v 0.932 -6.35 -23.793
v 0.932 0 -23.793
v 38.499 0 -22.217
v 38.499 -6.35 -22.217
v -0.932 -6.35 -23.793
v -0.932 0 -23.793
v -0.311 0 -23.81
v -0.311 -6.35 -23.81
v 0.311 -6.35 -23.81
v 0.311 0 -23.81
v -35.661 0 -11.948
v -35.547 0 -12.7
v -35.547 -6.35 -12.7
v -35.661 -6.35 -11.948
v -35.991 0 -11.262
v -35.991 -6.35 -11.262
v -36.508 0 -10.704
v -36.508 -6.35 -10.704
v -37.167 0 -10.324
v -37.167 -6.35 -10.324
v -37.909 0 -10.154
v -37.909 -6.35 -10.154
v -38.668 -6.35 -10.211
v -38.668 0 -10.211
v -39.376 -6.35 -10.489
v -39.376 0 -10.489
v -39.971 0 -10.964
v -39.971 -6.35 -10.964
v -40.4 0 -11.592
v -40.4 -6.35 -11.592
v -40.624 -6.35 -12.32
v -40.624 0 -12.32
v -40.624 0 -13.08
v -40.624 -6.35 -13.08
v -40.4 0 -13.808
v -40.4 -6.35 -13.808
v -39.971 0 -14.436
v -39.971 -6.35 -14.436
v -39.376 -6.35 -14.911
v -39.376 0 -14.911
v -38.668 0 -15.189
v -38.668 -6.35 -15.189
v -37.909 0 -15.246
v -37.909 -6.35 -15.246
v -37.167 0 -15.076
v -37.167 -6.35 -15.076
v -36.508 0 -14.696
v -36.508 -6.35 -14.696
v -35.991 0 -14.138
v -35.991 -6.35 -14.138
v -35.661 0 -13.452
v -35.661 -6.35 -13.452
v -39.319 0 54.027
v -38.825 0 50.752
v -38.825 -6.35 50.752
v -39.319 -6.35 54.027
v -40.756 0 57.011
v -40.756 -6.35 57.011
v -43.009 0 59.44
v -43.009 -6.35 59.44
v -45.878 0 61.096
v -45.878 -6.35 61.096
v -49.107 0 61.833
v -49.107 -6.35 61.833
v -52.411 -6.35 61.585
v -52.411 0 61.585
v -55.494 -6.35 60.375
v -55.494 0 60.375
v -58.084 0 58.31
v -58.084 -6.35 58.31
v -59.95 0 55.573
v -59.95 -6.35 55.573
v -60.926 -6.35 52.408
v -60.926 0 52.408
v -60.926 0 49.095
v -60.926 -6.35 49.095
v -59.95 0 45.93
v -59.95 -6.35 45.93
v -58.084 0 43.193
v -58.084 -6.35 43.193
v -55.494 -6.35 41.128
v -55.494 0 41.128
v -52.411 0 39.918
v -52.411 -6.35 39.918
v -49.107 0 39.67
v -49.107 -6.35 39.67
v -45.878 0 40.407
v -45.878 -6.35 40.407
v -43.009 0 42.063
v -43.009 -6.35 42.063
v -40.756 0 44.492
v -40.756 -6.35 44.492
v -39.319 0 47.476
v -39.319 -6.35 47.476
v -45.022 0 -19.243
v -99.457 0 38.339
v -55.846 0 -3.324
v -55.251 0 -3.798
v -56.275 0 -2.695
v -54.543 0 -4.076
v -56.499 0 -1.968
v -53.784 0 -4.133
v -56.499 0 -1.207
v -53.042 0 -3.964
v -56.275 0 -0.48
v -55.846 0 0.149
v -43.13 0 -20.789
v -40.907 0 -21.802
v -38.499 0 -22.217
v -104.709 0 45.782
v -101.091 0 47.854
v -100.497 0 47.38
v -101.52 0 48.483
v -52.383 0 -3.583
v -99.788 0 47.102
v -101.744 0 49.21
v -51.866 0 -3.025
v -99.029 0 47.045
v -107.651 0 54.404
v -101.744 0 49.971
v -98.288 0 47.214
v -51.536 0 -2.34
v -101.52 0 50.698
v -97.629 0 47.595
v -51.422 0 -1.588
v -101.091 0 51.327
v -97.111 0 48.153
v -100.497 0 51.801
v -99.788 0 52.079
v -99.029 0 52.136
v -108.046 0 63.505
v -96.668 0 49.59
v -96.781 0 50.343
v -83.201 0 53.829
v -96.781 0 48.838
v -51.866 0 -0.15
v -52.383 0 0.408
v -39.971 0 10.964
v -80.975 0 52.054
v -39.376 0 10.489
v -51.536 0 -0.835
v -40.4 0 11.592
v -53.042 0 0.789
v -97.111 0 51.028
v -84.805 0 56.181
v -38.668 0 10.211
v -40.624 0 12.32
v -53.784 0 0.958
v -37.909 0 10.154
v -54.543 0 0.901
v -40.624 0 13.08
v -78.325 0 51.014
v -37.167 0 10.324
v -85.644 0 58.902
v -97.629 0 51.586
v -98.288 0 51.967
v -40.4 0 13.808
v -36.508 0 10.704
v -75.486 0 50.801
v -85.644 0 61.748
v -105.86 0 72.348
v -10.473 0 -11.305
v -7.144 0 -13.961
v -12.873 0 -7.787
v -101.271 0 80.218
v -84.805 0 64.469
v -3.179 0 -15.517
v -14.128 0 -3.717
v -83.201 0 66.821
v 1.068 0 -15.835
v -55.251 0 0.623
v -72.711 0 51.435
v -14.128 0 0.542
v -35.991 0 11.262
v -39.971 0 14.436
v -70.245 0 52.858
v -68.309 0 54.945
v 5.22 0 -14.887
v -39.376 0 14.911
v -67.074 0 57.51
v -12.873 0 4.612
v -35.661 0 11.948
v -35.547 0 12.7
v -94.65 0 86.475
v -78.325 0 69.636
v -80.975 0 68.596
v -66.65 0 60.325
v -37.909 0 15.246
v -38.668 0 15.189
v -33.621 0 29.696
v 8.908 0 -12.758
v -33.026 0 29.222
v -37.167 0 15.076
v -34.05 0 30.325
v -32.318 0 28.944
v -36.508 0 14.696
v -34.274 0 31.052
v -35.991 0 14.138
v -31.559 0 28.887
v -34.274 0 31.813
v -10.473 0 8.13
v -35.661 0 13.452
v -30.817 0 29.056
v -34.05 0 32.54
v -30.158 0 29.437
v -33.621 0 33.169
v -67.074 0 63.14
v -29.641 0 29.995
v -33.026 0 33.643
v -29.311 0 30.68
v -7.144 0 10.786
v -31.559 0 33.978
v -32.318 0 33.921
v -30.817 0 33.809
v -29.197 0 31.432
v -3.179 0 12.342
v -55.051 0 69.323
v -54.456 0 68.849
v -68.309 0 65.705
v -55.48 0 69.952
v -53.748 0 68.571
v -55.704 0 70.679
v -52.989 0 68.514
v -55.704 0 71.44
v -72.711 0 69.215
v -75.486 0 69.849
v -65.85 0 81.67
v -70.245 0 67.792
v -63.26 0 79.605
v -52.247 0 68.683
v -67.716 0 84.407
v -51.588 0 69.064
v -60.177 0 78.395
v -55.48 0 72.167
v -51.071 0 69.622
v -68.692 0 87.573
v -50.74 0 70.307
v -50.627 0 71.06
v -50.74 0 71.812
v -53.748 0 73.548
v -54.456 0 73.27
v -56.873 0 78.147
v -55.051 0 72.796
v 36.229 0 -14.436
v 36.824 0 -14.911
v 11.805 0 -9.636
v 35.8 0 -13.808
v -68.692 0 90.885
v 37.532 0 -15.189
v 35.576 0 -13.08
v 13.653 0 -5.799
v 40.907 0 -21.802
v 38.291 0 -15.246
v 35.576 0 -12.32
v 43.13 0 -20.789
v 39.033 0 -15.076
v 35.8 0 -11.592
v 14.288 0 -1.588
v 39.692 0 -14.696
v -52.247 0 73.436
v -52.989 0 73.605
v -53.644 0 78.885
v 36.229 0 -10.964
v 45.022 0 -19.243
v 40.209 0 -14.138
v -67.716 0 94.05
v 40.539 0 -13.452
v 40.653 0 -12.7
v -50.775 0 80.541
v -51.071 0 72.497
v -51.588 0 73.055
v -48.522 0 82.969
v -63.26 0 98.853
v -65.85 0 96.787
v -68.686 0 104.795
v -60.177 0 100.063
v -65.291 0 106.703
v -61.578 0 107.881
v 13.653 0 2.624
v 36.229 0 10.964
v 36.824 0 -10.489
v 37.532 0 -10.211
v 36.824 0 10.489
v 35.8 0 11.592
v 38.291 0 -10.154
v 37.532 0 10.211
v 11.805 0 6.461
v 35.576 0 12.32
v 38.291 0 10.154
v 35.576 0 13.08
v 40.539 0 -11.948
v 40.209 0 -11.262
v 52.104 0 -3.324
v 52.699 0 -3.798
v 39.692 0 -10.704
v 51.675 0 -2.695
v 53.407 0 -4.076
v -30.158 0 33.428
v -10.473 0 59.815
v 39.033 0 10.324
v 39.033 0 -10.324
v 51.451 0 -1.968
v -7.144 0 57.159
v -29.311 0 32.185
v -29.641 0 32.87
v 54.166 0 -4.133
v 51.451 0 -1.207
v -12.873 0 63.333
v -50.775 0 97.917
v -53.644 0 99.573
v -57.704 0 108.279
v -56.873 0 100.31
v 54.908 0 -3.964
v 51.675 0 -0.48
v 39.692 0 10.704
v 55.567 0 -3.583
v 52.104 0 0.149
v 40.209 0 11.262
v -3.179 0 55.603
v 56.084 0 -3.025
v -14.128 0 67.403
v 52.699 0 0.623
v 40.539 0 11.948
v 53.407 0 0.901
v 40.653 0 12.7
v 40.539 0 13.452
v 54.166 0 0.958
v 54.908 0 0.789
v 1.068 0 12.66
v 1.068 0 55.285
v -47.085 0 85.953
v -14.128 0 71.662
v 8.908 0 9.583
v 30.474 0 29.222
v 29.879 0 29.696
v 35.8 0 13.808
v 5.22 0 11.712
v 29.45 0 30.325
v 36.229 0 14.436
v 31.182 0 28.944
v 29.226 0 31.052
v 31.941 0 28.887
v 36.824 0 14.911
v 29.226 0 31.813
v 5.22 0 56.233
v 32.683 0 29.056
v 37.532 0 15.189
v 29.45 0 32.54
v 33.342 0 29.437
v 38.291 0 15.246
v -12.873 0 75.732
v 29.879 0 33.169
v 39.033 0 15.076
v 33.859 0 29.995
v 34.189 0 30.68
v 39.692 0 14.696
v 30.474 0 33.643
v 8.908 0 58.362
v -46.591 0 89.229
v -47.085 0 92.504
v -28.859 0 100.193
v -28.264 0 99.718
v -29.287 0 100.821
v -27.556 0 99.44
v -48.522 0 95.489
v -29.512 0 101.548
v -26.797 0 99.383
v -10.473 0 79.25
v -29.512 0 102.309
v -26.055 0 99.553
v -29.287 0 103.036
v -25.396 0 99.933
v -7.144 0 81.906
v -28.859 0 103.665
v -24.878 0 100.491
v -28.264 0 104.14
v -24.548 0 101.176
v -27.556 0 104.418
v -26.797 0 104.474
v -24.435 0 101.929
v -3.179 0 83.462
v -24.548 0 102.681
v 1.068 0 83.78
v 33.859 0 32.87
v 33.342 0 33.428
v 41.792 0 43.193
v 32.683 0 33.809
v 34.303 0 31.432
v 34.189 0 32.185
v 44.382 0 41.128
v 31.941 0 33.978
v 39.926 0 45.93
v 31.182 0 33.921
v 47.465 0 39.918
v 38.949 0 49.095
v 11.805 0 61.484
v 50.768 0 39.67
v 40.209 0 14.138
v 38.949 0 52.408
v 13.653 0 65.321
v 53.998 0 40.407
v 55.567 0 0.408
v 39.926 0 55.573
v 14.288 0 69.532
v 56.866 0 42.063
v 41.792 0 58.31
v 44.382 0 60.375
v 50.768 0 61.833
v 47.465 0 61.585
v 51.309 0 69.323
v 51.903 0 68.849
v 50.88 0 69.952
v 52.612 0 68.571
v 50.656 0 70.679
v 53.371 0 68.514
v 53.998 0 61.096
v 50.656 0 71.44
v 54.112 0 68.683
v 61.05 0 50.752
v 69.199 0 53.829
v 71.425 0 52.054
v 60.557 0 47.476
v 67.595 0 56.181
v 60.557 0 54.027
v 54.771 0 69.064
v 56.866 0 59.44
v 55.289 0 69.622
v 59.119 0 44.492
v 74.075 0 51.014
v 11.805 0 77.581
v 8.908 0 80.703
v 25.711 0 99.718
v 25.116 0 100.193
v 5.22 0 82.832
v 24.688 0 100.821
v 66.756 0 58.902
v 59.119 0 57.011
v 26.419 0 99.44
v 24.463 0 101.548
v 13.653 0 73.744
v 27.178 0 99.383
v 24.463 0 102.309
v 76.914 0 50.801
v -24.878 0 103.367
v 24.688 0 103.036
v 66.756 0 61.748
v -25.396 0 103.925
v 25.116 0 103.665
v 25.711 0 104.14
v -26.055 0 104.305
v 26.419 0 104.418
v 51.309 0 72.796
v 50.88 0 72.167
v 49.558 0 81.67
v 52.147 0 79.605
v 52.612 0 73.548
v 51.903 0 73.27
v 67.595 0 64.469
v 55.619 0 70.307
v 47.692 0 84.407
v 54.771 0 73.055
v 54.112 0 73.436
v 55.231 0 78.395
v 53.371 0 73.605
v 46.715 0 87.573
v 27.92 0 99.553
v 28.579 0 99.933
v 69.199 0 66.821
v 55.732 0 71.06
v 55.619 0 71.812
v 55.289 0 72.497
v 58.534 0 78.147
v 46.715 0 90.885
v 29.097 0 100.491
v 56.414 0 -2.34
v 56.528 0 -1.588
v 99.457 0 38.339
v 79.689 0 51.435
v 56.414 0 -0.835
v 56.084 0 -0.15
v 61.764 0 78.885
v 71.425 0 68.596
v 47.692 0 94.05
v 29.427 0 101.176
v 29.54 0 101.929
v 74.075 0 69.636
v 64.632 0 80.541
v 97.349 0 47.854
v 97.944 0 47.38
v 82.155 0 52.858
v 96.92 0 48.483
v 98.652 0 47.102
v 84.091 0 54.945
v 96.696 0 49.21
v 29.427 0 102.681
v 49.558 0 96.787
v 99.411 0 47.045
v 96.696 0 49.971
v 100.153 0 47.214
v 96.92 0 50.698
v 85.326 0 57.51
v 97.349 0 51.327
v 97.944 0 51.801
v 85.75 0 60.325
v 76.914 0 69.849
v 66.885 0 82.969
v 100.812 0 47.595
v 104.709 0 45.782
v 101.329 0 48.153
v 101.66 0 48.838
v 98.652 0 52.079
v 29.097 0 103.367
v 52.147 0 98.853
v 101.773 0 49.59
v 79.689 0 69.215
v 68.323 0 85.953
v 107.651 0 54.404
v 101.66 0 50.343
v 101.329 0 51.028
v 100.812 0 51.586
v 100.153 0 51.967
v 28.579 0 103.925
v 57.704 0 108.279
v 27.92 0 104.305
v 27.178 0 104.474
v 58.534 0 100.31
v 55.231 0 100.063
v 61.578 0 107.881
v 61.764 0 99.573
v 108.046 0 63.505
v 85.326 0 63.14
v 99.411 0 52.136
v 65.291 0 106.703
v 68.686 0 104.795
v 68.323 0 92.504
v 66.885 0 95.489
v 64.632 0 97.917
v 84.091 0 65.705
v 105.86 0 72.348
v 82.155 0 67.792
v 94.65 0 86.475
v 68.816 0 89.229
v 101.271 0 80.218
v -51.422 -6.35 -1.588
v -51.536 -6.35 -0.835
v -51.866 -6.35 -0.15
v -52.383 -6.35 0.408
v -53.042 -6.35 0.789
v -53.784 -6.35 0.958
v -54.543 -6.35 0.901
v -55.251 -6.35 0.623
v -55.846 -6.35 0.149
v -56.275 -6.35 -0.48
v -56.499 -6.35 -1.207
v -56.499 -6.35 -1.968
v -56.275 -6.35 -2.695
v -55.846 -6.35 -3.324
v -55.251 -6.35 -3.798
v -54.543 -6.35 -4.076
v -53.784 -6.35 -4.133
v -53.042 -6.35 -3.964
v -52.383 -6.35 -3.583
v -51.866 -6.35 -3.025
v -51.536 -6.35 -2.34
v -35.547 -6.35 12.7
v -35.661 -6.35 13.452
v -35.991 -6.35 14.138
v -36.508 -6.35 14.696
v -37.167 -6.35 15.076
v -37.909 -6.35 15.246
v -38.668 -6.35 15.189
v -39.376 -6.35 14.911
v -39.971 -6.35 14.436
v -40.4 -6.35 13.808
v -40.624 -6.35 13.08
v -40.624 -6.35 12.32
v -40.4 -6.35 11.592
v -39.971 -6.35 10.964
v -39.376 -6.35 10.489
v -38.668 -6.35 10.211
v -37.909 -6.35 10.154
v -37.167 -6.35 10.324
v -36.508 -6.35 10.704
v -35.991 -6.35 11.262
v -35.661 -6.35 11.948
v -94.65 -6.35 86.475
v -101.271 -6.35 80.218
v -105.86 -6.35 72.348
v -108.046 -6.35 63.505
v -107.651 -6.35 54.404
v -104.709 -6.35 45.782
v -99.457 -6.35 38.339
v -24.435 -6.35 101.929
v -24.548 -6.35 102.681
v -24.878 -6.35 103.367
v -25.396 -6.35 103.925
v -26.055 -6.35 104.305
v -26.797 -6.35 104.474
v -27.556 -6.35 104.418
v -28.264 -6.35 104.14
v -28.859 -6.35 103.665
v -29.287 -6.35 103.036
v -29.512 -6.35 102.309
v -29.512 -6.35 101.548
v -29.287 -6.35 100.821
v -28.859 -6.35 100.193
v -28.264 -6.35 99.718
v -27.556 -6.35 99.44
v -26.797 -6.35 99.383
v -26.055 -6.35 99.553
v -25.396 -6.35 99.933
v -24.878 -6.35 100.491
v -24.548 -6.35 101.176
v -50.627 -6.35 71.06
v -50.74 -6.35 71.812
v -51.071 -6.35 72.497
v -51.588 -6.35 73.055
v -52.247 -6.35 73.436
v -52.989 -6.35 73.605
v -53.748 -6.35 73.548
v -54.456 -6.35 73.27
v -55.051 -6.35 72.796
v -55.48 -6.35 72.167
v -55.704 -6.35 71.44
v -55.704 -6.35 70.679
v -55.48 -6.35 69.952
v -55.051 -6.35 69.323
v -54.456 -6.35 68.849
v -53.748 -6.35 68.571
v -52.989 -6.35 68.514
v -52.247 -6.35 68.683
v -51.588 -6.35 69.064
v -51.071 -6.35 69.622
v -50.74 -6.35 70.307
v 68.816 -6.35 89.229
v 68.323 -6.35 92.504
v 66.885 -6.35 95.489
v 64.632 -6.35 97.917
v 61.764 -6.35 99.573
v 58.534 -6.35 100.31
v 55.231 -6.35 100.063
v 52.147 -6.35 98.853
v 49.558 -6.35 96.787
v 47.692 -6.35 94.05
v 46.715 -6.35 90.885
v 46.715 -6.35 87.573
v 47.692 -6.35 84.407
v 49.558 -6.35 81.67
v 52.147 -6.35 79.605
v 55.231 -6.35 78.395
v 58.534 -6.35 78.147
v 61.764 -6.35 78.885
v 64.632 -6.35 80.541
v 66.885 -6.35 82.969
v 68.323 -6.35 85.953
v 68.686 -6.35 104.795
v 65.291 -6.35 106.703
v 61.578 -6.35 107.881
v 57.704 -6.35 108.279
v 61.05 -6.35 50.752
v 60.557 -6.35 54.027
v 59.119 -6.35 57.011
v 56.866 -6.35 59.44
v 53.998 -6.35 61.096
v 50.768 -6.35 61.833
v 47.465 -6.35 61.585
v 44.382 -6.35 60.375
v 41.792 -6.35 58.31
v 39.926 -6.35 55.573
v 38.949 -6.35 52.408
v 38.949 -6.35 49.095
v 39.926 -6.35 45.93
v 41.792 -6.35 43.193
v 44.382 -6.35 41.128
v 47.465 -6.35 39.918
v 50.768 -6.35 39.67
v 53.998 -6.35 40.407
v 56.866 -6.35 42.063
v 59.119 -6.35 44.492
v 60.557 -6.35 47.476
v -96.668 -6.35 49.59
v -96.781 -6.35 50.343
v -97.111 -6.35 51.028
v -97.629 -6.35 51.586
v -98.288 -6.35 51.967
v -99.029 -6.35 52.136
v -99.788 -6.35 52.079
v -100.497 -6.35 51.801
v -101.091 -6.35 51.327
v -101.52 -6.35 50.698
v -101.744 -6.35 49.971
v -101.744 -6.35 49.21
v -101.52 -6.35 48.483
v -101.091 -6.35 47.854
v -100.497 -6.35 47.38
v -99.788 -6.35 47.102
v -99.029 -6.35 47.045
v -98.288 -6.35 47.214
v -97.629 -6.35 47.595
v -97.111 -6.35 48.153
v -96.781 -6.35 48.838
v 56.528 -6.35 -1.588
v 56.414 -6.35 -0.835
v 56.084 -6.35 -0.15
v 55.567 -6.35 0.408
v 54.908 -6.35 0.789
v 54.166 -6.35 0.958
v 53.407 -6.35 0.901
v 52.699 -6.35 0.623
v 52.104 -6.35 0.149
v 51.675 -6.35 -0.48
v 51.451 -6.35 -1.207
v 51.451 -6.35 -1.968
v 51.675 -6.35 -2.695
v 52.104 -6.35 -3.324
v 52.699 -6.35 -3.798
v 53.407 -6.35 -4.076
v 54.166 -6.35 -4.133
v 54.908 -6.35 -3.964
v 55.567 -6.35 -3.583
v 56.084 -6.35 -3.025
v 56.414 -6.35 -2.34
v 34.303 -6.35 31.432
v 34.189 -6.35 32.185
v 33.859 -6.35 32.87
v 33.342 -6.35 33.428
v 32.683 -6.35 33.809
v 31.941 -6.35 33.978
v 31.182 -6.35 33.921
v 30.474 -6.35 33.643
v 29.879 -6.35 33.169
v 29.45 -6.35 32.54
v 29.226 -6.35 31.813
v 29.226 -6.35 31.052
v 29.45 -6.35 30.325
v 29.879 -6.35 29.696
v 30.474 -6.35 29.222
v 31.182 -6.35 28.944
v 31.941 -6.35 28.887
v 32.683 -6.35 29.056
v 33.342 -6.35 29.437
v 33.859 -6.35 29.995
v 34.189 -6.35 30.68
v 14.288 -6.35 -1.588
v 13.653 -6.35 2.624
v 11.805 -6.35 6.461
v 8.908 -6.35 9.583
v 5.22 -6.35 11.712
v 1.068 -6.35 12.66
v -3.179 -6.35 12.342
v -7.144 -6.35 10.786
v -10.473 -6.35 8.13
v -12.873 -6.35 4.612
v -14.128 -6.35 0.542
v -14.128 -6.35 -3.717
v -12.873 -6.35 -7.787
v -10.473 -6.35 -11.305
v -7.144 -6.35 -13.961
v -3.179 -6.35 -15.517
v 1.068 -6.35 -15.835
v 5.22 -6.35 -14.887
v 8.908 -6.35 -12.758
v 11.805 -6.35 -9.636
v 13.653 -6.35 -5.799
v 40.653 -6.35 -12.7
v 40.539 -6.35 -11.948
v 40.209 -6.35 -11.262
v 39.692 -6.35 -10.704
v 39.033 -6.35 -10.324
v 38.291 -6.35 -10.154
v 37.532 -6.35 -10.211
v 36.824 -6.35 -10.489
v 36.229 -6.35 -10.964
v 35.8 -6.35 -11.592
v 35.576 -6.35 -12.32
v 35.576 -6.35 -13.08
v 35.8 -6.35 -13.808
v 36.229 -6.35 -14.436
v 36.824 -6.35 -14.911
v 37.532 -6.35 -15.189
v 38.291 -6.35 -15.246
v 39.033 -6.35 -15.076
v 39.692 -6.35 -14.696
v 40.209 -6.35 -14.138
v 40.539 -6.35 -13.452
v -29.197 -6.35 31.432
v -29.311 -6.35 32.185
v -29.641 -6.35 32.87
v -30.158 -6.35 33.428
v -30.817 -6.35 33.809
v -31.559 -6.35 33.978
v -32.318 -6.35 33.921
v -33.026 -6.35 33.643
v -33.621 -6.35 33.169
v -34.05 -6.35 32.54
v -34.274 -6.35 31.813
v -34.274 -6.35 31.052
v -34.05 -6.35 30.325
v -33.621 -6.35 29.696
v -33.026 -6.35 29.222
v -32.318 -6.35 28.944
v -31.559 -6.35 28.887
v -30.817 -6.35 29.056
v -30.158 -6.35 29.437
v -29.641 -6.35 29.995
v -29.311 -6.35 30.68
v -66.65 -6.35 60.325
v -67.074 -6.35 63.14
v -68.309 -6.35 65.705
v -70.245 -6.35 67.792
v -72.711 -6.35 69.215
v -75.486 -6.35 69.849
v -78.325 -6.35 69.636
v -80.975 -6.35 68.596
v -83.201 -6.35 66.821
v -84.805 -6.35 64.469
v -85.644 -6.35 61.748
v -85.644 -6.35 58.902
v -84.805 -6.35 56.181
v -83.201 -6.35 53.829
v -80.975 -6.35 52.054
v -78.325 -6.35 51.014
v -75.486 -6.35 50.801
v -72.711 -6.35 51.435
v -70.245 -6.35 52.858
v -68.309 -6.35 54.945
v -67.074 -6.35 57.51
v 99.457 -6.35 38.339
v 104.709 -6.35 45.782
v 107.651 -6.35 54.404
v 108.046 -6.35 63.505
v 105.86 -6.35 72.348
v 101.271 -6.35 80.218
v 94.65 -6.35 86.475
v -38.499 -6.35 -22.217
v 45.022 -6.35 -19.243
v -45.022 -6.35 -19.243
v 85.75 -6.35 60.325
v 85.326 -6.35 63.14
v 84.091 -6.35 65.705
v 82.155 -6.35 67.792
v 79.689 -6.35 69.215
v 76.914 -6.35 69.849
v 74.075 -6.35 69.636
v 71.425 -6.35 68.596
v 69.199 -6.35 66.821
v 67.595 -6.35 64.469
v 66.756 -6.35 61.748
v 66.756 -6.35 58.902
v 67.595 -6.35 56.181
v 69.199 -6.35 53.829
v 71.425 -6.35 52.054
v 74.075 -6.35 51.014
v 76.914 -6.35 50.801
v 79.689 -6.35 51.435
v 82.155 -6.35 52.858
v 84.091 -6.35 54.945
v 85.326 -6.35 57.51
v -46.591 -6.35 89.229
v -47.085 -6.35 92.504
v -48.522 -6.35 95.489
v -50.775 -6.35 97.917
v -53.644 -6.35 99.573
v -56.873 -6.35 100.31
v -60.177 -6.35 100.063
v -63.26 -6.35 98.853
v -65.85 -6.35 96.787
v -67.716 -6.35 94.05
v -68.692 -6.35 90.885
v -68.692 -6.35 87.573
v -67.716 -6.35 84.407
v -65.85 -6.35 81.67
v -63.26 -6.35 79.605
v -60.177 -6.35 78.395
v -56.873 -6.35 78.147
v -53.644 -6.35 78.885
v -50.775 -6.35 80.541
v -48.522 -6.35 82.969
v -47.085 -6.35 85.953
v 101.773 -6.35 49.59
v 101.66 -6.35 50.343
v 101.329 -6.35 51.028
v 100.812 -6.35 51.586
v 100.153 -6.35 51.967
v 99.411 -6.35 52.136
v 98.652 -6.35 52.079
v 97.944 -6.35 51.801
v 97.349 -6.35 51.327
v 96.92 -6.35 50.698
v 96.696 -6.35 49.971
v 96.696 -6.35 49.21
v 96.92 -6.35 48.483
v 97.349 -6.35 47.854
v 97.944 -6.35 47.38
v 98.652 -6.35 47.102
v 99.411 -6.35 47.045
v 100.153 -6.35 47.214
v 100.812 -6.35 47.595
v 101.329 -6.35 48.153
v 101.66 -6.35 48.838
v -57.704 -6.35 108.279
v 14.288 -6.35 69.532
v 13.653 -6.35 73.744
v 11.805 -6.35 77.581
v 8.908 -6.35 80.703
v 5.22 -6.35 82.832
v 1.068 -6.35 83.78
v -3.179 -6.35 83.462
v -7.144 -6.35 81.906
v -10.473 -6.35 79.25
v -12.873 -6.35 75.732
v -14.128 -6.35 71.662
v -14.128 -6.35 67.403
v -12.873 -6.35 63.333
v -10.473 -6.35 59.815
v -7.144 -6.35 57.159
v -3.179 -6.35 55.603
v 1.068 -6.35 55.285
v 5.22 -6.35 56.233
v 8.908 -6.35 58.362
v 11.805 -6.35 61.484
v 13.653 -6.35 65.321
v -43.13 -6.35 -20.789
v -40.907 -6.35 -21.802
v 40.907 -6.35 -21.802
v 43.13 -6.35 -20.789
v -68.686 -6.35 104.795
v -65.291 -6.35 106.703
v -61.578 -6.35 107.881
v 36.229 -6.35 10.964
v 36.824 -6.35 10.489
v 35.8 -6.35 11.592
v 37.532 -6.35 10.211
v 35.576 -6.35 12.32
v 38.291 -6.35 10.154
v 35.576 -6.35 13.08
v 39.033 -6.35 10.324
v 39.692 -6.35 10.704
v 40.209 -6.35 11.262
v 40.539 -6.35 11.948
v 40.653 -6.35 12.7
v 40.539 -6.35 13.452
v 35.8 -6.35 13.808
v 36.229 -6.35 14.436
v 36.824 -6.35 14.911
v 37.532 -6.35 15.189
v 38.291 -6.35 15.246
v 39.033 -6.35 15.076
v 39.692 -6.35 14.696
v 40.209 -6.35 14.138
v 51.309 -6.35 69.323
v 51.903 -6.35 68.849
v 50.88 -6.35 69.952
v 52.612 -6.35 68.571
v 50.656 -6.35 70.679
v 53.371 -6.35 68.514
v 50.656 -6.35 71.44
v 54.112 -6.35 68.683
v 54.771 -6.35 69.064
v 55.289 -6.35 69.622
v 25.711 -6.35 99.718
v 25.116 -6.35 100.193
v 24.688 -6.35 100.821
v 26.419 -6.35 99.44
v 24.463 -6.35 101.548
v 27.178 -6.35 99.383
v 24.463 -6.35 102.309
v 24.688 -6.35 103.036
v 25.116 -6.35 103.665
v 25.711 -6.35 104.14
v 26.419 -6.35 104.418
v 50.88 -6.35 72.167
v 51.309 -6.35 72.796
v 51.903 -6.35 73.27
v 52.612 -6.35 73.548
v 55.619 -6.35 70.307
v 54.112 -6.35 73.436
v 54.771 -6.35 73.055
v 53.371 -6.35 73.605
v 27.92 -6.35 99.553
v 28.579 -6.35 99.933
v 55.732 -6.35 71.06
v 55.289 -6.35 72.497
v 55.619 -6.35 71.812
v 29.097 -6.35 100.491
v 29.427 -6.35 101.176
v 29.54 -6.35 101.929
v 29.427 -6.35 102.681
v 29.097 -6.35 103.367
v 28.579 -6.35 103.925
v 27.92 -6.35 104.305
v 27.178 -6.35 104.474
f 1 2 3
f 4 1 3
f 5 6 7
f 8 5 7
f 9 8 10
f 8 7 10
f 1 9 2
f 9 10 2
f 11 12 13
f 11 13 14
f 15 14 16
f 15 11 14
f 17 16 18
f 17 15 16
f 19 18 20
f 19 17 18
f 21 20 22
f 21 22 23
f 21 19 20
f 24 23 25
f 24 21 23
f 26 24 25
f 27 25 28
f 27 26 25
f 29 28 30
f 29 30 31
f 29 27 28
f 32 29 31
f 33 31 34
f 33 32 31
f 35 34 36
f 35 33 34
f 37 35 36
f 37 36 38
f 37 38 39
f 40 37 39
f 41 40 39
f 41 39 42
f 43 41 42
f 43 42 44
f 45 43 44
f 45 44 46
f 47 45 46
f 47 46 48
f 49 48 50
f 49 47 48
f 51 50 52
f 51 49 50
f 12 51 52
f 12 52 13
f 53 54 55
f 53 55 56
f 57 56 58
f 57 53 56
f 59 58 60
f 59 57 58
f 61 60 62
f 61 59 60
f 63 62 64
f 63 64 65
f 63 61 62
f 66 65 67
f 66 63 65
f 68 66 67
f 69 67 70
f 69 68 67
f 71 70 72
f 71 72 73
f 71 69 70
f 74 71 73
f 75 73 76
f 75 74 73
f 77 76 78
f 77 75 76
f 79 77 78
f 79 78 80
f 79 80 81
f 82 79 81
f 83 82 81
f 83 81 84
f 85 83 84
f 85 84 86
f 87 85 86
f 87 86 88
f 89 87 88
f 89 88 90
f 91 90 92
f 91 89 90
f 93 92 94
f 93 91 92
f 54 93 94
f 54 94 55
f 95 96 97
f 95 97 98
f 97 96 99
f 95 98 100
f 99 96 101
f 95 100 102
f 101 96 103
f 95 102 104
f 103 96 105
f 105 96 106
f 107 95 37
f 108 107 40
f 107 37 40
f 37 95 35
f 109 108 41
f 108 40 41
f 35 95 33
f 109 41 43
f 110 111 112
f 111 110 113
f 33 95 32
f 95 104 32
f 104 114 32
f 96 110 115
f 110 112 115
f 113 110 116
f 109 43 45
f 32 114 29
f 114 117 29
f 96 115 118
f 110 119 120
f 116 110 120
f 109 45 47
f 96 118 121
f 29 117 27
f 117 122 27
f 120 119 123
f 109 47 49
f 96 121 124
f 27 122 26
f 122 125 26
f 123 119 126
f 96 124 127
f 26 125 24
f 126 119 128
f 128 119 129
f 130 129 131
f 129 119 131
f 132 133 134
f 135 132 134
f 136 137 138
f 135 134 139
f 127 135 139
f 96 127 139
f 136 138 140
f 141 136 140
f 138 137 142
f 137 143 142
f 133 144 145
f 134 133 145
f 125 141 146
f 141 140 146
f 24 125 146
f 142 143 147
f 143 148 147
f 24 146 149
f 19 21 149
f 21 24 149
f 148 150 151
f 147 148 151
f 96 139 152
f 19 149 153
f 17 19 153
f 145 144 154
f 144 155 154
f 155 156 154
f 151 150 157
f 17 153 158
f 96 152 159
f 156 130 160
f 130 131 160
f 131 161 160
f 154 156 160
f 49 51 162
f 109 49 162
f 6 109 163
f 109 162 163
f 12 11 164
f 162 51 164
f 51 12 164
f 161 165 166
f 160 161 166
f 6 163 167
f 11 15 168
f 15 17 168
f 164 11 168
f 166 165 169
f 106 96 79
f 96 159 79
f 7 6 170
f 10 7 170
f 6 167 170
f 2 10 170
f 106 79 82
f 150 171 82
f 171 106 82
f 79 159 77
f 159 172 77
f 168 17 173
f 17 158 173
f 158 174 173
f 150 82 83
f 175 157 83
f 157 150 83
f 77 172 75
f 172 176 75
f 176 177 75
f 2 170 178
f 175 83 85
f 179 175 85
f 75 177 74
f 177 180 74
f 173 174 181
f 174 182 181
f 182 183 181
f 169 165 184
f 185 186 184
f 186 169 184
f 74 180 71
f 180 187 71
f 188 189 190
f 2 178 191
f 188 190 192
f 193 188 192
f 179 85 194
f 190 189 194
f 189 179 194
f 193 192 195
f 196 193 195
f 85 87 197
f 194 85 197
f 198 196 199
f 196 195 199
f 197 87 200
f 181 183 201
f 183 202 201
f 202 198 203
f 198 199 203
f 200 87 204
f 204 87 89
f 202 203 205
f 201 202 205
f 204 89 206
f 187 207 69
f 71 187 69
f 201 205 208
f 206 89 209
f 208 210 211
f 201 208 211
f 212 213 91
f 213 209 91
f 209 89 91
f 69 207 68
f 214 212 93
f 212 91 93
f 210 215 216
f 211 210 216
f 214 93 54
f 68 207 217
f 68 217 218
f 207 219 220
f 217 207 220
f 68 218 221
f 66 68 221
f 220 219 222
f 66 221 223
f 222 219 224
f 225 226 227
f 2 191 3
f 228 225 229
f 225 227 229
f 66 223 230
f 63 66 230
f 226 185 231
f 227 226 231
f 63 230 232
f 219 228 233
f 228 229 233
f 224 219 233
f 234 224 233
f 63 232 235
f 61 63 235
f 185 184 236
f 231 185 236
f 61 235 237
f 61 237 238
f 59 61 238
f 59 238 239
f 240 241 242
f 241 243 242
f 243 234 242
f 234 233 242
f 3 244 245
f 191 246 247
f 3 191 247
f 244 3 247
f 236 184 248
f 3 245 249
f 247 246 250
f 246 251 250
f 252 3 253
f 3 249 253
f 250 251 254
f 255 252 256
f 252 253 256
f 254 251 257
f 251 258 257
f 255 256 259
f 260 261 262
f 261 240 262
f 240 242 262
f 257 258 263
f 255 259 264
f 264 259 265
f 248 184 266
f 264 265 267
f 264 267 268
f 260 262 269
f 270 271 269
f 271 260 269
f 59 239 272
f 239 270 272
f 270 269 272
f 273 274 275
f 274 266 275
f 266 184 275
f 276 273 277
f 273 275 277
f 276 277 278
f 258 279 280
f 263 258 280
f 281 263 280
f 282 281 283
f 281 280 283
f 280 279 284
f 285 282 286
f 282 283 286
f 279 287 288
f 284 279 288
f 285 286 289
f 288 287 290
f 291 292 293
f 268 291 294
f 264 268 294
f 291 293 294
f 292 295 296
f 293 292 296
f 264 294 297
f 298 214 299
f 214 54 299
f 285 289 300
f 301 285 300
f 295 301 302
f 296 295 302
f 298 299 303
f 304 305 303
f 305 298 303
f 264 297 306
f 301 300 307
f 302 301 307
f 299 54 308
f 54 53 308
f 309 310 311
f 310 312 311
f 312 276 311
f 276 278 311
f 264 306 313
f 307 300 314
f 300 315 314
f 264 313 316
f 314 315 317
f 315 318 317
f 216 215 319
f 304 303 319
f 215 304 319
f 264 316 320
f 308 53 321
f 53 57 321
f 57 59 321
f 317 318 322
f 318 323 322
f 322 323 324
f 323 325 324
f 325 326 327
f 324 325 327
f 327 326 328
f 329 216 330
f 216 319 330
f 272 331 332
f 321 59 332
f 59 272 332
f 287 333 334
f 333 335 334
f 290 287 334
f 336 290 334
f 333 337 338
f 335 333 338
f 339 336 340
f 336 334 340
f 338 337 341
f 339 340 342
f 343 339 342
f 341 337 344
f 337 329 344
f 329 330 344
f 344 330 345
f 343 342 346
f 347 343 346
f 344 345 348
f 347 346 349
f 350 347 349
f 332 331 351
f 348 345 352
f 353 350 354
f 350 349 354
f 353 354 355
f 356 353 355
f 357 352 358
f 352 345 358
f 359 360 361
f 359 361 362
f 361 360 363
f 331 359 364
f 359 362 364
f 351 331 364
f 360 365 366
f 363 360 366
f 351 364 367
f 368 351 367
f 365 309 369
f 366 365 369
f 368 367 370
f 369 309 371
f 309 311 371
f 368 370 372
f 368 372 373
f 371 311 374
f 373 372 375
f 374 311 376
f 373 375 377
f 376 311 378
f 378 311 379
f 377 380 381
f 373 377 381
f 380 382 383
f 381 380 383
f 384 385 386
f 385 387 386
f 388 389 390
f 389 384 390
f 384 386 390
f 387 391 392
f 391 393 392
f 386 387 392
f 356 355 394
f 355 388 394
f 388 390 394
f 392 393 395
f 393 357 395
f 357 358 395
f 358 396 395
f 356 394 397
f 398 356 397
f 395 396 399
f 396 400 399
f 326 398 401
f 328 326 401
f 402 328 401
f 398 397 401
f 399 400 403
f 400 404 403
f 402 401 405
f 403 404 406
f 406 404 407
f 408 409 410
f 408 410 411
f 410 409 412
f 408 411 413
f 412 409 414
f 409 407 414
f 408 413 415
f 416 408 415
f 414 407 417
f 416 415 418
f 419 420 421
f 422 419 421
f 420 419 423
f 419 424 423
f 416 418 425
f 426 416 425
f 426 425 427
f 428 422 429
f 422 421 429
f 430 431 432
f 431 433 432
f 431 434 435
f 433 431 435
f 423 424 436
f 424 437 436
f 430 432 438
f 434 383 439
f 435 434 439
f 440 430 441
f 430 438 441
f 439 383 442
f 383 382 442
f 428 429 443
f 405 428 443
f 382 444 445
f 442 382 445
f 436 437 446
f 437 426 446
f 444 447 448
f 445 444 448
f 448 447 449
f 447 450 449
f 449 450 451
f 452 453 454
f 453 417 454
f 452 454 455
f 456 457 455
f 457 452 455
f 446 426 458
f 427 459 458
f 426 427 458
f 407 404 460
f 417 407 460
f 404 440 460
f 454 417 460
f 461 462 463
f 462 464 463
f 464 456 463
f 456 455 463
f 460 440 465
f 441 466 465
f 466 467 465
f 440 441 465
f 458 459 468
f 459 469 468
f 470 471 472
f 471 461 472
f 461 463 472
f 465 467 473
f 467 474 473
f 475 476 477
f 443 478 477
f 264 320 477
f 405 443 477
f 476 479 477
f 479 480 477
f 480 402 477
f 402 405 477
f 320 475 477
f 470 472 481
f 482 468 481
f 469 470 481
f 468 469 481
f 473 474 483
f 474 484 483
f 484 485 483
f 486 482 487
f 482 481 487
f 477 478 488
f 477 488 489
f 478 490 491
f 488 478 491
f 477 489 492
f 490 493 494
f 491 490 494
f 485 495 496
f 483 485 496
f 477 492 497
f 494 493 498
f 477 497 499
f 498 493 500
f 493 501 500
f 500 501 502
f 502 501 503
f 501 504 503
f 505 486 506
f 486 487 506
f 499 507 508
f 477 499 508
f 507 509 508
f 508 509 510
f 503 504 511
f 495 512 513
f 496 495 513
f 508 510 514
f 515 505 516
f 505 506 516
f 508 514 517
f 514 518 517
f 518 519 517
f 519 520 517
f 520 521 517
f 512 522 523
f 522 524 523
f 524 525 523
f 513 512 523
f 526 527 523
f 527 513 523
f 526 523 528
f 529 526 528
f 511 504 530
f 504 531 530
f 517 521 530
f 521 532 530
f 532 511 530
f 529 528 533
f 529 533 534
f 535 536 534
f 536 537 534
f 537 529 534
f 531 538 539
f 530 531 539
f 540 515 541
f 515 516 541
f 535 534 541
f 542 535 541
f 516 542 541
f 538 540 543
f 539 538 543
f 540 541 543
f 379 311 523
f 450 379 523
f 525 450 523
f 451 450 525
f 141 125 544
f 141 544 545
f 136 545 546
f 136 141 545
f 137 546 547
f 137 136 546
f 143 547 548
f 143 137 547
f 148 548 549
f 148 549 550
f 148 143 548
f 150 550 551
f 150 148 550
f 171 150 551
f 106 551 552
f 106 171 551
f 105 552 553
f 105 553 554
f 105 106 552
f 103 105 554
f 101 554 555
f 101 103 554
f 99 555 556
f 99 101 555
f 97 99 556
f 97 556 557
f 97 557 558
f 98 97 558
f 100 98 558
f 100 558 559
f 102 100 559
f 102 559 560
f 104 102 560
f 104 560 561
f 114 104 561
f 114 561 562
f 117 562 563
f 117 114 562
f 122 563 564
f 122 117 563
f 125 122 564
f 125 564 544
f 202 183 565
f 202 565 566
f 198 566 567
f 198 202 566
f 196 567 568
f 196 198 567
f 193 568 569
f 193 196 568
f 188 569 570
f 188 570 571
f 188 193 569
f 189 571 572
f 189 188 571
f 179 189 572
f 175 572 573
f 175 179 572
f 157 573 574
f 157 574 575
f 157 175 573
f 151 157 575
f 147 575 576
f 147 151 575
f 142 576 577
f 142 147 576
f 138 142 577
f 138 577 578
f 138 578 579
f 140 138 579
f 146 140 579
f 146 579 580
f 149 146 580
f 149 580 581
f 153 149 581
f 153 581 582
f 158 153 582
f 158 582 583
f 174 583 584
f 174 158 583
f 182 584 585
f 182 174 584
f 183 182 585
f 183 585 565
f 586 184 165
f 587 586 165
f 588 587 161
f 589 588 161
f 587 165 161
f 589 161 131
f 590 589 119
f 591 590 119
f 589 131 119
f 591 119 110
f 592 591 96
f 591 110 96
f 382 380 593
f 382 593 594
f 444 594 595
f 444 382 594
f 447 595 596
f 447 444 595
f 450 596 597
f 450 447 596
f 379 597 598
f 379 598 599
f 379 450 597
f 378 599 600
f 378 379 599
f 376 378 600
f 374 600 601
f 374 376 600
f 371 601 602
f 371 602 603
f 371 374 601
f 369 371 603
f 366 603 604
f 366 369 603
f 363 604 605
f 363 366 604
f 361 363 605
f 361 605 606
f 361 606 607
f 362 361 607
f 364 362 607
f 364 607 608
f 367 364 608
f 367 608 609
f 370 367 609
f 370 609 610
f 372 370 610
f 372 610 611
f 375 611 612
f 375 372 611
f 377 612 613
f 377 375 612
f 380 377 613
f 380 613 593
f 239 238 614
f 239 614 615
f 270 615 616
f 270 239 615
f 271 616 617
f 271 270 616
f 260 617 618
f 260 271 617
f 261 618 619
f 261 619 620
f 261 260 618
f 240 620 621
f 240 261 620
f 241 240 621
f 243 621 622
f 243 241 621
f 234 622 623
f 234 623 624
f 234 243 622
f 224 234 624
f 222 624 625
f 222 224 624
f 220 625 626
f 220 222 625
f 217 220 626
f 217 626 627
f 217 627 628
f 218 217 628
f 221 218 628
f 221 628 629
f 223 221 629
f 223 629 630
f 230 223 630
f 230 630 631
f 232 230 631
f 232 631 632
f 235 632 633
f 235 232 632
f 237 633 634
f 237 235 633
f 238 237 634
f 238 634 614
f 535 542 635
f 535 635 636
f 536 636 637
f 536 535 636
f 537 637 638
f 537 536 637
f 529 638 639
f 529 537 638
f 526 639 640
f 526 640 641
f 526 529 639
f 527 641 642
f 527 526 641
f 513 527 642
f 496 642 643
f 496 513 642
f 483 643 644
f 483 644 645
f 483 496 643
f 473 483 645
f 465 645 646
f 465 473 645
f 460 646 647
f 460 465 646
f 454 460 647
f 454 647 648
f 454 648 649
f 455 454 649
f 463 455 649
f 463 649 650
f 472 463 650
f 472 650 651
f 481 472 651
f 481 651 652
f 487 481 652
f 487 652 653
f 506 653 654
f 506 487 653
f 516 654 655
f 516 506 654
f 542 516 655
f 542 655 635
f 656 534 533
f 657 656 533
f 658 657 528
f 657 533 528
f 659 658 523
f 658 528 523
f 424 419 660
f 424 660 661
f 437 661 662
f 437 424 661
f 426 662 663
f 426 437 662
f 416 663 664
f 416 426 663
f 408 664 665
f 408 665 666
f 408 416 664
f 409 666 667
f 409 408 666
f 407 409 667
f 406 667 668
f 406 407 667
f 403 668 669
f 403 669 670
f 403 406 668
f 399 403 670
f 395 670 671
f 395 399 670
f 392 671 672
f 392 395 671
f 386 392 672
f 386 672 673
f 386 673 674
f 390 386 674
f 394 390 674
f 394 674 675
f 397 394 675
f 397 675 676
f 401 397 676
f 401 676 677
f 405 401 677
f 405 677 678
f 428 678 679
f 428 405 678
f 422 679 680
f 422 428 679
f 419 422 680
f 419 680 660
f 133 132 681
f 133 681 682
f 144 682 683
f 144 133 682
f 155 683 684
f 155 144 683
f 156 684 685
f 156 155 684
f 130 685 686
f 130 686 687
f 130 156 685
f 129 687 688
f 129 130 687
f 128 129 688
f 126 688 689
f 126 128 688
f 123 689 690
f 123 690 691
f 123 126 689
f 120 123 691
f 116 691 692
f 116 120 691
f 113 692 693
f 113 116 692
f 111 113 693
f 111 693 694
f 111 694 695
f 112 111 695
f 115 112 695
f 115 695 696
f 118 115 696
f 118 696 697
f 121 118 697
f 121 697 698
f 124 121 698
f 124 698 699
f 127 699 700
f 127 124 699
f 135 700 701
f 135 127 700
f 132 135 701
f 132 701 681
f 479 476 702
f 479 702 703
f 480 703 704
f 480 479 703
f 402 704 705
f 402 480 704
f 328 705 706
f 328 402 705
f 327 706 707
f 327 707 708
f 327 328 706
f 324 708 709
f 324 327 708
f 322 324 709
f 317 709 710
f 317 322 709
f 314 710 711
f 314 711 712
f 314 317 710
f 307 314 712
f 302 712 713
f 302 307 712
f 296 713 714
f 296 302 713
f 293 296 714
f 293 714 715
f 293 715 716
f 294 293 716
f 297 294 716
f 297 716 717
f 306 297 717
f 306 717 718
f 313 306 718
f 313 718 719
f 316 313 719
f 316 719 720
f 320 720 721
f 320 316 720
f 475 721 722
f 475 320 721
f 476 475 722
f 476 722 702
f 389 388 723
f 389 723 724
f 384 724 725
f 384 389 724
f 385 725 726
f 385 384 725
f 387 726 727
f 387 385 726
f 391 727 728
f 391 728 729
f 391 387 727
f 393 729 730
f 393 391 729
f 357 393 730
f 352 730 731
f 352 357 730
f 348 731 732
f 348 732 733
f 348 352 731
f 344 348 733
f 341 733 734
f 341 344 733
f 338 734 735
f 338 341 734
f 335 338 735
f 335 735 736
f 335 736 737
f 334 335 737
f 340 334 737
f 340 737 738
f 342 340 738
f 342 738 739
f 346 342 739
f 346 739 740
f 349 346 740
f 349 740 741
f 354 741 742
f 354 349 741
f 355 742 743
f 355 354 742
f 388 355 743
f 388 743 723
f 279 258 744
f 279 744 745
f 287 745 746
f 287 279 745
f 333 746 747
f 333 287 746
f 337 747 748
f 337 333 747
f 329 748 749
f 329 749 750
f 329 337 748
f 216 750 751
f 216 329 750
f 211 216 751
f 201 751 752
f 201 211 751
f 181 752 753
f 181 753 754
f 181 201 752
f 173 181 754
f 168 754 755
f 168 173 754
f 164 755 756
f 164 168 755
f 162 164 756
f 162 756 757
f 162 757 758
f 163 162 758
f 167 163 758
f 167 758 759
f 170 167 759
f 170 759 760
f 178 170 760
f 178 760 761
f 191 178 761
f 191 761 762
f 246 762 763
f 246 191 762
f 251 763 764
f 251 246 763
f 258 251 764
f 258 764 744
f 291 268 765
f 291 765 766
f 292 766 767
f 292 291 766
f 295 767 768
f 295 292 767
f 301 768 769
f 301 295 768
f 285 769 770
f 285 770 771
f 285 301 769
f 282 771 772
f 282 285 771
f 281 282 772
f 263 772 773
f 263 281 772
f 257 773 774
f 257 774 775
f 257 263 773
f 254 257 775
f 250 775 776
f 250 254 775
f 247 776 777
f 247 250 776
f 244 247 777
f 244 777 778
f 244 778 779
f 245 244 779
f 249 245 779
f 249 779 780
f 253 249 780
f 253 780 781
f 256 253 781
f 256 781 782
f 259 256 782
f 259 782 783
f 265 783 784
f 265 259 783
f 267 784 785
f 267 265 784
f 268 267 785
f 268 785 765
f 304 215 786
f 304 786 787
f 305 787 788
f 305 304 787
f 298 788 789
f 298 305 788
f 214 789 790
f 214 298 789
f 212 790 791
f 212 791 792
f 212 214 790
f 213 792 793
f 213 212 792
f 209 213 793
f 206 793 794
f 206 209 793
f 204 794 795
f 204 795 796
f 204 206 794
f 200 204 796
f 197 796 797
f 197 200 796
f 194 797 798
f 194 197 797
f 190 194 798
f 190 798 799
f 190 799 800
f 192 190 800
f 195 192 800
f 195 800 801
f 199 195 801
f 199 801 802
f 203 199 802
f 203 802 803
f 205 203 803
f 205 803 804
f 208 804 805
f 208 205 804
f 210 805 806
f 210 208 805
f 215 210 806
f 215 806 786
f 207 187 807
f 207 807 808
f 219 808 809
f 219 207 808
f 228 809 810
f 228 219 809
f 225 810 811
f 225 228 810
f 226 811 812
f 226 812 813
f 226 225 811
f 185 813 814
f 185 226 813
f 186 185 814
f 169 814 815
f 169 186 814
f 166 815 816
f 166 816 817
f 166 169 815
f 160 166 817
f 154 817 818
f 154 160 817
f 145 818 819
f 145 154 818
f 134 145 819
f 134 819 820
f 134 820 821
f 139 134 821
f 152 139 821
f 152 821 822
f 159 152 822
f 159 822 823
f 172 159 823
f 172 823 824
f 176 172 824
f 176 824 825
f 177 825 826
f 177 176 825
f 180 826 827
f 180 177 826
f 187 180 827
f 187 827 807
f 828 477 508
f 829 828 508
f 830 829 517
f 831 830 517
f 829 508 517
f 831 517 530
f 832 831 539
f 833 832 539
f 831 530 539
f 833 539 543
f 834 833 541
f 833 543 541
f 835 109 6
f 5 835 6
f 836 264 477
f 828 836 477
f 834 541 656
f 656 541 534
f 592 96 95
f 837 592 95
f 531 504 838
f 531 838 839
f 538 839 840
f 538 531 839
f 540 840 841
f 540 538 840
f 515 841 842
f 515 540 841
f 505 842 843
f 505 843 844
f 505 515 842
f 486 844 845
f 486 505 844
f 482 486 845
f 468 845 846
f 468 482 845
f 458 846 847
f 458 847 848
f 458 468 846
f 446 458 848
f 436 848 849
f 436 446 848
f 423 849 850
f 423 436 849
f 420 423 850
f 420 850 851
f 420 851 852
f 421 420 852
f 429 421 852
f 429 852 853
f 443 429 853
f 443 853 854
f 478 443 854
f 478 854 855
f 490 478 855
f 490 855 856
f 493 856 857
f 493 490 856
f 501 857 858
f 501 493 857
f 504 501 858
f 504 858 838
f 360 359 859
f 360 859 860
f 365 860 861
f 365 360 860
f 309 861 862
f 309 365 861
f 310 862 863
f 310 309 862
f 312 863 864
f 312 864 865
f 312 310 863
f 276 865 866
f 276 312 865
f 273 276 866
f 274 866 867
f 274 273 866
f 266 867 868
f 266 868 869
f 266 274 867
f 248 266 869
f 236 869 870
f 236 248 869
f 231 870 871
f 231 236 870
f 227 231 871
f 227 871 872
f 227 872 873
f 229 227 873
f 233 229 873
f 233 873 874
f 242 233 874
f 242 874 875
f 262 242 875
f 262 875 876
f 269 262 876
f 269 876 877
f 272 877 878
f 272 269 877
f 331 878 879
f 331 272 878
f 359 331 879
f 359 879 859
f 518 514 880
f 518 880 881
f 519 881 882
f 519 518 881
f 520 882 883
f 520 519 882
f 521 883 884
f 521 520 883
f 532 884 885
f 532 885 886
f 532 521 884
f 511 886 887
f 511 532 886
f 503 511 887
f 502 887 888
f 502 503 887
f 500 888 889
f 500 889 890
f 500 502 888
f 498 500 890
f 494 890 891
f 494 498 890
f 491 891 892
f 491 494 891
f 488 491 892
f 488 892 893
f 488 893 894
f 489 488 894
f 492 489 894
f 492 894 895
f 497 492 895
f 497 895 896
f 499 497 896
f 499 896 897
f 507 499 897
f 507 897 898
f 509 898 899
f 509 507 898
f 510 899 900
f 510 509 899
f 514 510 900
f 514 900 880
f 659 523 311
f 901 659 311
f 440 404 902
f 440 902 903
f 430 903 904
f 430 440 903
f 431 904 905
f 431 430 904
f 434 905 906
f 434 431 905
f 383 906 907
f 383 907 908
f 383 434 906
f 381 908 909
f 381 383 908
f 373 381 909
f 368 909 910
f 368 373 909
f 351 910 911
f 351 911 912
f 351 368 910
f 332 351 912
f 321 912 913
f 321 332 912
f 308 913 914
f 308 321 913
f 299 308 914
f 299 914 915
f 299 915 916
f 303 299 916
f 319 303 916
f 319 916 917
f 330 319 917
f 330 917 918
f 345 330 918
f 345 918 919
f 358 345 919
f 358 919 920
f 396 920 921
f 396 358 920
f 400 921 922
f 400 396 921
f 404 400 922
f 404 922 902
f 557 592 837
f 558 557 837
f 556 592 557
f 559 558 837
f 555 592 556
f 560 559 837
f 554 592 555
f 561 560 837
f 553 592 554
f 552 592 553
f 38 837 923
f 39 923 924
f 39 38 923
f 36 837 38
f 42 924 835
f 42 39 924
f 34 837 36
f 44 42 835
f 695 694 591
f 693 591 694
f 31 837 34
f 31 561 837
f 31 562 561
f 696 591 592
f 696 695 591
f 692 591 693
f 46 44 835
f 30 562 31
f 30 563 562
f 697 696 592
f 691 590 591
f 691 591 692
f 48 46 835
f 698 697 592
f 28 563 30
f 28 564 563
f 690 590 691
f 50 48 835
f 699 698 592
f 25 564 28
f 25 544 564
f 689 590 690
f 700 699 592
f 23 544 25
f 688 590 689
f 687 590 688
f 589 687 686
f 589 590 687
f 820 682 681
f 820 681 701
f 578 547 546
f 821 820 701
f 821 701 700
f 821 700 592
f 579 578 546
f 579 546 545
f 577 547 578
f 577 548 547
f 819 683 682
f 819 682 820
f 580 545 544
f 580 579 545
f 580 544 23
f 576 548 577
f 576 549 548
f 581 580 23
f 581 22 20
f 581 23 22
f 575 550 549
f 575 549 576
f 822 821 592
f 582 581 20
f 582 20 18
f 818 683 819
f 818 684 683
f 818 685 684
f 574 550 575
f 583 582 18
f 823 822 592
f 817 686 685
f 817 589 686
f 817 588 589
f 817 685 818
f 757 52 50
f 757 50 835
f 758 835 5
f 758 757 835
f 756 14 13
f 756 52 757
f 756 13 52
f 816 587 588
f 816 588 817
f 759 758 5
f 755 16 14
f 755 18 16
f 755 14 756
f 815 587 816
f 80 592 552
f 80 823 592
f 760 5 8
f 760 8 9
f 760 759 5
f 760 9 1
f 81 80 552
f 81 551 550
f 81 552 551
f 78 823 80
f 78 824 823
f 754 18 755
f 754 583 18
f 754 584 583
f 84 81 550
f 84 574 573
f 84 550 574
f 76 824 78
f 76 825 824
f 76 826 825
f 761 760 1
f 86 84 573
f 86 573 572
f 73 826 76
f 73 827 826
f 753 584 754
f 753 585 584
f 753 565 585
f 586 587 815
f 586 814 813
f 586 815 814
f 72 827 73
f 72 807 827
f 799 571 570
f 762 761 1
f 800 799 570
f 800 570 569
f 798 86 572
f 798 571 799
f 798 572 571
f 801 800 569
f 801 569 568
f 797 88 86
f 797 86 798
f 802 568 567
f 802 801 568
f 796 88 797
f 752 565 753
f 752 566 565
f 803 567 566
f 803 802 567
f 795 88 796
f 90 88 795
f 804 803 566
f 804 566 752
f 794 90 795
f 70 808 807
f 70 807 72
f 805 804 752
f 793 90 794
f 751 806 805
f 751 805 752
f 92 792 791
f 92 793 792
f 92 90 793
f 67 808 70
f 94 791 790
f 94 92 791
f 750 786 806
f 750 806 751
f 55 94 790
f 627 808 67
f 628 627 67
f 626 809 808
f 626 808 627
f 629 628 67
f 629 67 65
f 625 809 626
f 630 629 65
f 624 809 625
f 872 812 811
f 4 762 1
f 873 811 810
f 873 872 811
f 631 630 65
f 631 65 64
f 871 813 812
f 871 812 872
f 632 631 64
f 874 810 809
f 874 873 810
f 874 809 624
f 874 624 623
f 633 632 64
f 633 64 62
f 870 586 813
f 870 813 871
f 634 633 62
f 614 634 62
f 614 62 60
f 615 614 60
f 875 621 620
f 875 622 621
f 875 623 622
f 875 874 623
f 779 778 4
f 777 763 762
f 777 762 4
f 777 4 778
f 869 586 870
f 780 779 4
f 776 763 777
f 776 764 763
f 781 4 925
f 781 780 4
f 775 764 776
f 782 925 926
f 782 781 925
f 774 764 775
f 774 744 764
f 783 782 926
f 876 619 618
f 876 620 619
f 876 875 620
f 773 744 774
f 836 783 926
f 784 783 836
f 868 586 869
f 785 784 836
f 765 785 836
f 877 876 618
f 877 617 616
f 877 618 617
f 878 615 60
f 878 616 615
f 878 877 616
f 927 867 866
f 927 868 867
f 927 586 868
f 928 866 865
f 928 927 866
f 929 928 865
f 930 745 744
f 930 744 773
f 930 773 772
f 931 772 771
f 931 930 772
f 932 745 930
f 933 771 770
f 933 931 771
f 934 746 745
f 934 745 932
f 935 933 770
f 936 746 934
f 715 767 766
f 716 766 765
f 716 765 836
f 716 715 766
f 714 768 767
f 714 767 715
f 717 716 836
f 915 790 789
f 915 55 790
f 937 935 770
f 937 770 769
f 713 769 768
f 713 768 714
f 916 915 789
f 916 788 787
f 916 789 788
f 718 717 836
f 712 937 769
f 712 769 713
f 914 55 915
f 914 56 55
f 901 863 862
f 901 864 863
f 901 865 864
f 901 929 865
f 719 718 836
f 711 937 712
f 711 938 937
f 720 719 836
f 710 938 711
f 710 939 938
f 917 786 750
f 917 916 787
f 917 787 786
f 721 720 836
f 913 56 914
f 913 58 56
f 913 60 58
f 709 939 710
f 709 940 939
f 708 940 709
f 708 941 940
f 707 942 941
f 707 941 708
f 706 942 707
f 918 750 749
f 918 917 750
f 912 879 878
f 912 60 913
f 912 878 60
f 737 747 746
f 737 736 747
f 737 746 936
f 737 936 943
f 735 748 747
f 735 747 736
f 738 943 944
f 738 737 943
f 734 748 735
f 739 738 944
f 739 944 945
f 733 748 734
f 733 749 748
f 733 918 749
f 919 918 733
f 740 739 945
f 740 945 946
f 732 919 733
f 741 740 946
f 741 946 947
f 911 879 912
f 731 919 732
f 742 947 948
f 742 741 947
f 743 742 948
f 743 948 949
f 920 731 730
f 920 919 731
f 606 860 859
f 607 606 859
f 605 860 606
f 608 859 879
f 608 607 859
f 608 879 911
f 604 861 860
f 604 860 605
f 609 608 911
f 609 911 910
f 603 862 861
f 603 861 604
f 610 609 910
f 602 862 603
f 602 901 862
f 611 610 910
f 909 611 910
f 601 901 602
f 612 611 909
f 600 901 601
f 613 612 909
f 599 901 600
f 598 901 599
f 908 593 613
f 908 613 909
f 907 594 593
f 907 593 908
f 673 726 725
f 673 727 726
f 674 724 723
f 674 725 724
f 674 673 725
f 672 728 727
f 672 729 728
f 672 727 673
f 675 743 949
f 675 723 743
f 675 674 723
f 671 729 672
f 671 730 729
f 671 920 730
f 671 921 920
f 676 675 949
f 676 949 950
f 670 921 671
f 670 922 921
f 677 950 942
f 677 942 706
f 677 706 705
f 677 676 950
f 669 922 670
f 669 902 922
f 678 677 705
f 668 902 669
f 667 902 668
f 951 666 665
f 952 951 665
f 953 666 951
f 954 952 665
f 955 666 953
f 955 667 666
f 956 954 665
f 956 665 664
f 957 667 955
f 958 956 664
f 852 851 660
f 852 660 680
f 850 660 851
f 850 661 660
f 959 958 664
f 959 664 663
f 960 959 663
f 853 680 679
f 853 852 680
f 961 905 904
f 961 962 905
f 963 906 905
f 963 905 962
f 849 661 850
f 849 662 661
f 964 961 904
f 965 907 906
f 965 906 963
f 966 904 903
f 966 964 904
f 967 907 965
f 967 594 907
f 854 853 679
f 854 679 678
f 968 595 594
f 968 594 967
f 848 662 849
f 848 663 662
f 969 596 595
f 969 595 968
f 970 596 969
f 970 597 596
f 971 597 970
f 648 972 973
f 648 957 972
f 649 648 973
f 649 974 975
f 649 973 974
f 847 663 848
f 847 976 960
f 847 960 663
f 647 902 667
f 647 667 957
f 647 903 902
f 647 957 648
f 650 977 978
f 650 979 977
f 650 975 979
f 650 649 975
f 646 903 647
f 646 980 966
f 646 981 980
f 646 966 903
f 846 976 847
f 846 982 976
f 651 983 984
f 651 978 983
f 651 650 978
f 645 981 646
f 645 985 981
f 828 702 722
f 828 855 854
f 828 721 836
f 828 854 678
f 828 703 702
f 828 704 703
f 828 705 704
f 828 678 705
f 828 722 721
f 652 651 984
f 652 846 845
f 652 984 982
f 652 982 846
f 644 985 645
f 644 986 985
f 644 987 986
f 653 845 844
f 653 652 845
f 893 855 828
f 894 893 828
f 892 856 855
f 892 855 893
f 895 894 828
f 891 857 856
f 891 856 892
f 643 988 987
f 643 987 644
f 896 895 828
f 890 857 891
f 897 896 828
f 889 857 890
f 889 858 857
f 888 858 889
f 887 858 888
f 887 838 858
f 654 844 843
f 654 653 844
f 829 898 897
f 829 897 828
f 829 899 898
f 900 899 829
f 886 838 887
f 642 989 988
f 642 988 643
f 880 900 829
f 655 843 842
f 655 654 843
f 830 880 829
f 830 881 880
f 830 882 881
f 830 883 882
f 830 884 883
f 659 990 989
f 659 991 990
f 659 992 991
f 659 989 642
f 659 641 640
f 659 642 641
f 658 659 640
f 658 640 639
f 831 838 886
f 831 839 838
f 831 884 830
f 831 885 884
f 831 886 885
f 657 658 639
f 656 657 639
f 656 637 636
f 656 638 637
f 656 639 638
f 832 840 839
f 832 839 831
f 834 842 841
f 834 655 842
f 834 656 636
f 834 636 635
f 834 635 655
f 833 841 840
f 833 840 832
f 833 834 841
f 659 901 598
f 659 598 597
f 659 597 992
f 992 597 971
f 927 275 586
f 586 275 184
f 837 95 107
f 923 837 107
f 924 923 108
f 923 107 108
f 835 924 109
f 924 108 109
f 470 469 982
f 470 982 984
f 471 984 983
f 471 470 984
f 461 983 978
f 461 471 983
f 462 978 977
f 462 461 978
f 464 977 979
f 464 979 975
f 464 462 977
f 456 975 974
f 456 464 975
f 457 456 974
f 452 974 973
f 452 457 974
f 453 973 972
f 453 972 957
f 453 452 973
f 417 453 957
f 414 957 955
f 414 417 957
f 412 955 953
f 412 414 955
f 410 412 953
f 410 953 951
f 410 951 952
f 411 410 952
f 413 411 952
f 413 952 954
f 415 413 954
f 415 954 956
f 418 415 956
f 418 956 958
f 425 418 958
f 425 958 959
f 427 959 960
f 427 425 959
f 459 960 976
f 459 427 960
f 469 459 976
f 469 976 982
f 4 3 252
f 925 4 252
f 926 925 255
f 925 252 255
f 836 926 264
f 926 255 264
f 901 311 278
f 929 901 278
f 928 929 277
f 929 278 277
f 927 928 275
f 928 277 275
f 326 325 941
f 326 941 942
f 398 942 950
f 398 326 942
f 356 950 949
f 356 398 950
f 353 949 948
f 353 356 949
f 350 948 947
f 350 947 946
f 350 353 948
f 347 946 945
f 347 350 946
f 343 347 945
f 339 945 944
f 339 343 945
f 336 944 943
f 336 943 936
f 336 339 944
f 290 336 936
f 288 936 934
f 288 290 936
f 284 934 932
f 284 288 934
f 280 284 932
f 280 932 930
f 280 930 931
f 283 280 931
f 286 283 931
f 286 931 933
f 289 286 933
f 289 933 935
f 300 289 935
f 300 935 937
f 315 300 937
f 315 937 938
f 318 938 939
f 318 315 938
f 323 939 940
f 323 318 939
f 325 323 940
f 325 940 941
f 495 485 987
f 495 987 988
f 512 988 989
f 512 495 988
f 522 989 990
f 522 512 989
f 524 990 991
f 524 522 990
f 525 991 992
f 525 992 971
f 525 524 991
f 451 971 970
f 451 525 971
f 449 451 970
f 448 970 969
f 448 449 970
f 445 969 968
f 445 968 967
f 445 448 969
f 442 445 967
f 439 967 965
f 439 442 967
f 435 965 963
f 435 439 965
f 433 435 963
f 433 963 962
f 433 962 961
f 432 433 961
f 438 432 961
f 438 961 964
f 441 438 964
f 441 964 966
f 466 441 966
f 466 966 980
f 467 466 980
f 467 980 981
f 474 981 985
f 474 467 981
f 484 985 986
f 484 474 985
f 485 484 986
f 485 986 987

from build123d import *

# Parameters (mm, degrees)
F0_R     = 2.5527
F0_R_2   = 14.2875
F0_R_3   = 9.5504
F0_R_4   = 11.1125
F1_DEPTH = 6.35


with BuildPart() as f1:
    # F0 (on Front) → F1 (new body)
    with BuildSketch(Plane.XZ):
        with BuildLine():
            Line((-99.456923, 38.339287), (-45.021703, -19.243367))
            ThreePointArc((-45.021703, -19.243367), (-42.050874, -21.366962), (-38.499317, -22.216626))
            Line((-38.499317, -22.216626), (-0.931741, -23.792961))
            ThreePointArc((-0.931741, -23.792961), (0, -23.8125), (0.931741, -23.792961))
            Line((0.931741, -23.792961), (38.499317, -22.216626))
            ThreePointArc((38.499317, -22.216626), (42.050874, -21.366962), (45.021703, -19.243367))
            Line((45.021703, -19.243367), (99.456923, 38.339287))
            ThreePointArc((99.456923, 38.339287), (108.045638, 63.504837), (94.65047, 86.475261))
            Line((94.65047, 86.475261), (68.686167, 104.794528))
            ThreePointArc((68.686167, 104.794528), (63.4647, 107.386922), (57.703744, 108.278896))
            Line((57.703744, 108.278896), (-57.703744, 108.278896))
            ThreePointArc((-57.703744, 108.278896), (-63.4647, 107.386922), (-68.686167, 104.794528))
            Line((-68.686167, 104.794528), (-94.65047, 86.475261))
            ThreePointArc((-94.65047, 86.475261), (-108.045638, 63.504837), (-99.456923, 38.339287))
        make_face()
        with Locations((-38.1, -12.7)):
            Circle(F0_R, mode=Mode.SUBTRACT)
        with Locations((-53.975, -1.5875)):
            Circle(F0_R, mode=Mode.SUBTRACT)
        with Locations((0, -1.5875)):
            Circle(F0_R_2, mode=Mode.SUBTRACT)
        with Locations((-38.1, 12.7)):
            Circle(F0_R, mode=Mode.SUBTRACT)
        with Locations((-31.75, 31.4325)):
            Circle(F0_R, mode=Mode.SUBTRACT)
        with Locations((38.1, -12.7)):
            Circle(F0_R, mode=Mode.SUBTRACT)
        with Locations((53.975, -1.5875)):
            Circle(F0_R, mode=Mode.SUBTRACT)
        with Locations((38.1, 12.7)):
            Circle(F0_R, mode=Mode.SUBTRACT)
        with Locations((31.75, 31.4325)):
            Circle(F0_R, mode=Mode.SUBTRACT)
        with Locations((-99.220218, 49.590496)):
            Circle(F0_R, mode=Mode.SUBTRACT)
        with Locations((-76.2, 60.325)):
            Circle(F0_R_3, mode=Mode.SUBTRACT)
        with Locations((-49.937819, 50.751531)):
            Circle(F0_R_4, mode=Mode.SUBTRACT)
        with Locations((-53.179782, 71.059504)):
            Circle(F0_R, mode=Mode.SUBTRACT)
        with Locations((0, 69.5325)):
            Circle(F0_R_2, mode=Mode.SUBTRACT)
        with Locations((-57.703744, 89.228896)):
            Circle(F0_R_4, mode=Mode.SUBTRACT)
        with Locations((-26.9875, 101.928896)):
            Circle(F0_R, mode=Mode.SUBTRACT)
        with Locations((49.937819, 50.751531)):
            Circle(F0_R_4, mode=Mode.SUBTRACT)
        with Locations((53.179782, 71.059504)):
            Circle(F0_R, mode=Mode.SUBTRACT)
        with Locations((99.220218, 49.590496)):
            Circle(F0_R, mode=Mode.SUBTRACT)
        with Locations((76.2, 60.325)):
            Circle(F0_R_3, mode=Mode.SUBTRACT)
        with Locations((26.9875, 101.928896)):
            Circle(F0_R, mode=Mode.SUBTRACT)
        with Locations((57.703744, 89.228896)):
            Circle(F0_R_4, mode=Mode.SUBTRACT)
    extrude(amount=F1_DEPTH)


solid = f1.part
